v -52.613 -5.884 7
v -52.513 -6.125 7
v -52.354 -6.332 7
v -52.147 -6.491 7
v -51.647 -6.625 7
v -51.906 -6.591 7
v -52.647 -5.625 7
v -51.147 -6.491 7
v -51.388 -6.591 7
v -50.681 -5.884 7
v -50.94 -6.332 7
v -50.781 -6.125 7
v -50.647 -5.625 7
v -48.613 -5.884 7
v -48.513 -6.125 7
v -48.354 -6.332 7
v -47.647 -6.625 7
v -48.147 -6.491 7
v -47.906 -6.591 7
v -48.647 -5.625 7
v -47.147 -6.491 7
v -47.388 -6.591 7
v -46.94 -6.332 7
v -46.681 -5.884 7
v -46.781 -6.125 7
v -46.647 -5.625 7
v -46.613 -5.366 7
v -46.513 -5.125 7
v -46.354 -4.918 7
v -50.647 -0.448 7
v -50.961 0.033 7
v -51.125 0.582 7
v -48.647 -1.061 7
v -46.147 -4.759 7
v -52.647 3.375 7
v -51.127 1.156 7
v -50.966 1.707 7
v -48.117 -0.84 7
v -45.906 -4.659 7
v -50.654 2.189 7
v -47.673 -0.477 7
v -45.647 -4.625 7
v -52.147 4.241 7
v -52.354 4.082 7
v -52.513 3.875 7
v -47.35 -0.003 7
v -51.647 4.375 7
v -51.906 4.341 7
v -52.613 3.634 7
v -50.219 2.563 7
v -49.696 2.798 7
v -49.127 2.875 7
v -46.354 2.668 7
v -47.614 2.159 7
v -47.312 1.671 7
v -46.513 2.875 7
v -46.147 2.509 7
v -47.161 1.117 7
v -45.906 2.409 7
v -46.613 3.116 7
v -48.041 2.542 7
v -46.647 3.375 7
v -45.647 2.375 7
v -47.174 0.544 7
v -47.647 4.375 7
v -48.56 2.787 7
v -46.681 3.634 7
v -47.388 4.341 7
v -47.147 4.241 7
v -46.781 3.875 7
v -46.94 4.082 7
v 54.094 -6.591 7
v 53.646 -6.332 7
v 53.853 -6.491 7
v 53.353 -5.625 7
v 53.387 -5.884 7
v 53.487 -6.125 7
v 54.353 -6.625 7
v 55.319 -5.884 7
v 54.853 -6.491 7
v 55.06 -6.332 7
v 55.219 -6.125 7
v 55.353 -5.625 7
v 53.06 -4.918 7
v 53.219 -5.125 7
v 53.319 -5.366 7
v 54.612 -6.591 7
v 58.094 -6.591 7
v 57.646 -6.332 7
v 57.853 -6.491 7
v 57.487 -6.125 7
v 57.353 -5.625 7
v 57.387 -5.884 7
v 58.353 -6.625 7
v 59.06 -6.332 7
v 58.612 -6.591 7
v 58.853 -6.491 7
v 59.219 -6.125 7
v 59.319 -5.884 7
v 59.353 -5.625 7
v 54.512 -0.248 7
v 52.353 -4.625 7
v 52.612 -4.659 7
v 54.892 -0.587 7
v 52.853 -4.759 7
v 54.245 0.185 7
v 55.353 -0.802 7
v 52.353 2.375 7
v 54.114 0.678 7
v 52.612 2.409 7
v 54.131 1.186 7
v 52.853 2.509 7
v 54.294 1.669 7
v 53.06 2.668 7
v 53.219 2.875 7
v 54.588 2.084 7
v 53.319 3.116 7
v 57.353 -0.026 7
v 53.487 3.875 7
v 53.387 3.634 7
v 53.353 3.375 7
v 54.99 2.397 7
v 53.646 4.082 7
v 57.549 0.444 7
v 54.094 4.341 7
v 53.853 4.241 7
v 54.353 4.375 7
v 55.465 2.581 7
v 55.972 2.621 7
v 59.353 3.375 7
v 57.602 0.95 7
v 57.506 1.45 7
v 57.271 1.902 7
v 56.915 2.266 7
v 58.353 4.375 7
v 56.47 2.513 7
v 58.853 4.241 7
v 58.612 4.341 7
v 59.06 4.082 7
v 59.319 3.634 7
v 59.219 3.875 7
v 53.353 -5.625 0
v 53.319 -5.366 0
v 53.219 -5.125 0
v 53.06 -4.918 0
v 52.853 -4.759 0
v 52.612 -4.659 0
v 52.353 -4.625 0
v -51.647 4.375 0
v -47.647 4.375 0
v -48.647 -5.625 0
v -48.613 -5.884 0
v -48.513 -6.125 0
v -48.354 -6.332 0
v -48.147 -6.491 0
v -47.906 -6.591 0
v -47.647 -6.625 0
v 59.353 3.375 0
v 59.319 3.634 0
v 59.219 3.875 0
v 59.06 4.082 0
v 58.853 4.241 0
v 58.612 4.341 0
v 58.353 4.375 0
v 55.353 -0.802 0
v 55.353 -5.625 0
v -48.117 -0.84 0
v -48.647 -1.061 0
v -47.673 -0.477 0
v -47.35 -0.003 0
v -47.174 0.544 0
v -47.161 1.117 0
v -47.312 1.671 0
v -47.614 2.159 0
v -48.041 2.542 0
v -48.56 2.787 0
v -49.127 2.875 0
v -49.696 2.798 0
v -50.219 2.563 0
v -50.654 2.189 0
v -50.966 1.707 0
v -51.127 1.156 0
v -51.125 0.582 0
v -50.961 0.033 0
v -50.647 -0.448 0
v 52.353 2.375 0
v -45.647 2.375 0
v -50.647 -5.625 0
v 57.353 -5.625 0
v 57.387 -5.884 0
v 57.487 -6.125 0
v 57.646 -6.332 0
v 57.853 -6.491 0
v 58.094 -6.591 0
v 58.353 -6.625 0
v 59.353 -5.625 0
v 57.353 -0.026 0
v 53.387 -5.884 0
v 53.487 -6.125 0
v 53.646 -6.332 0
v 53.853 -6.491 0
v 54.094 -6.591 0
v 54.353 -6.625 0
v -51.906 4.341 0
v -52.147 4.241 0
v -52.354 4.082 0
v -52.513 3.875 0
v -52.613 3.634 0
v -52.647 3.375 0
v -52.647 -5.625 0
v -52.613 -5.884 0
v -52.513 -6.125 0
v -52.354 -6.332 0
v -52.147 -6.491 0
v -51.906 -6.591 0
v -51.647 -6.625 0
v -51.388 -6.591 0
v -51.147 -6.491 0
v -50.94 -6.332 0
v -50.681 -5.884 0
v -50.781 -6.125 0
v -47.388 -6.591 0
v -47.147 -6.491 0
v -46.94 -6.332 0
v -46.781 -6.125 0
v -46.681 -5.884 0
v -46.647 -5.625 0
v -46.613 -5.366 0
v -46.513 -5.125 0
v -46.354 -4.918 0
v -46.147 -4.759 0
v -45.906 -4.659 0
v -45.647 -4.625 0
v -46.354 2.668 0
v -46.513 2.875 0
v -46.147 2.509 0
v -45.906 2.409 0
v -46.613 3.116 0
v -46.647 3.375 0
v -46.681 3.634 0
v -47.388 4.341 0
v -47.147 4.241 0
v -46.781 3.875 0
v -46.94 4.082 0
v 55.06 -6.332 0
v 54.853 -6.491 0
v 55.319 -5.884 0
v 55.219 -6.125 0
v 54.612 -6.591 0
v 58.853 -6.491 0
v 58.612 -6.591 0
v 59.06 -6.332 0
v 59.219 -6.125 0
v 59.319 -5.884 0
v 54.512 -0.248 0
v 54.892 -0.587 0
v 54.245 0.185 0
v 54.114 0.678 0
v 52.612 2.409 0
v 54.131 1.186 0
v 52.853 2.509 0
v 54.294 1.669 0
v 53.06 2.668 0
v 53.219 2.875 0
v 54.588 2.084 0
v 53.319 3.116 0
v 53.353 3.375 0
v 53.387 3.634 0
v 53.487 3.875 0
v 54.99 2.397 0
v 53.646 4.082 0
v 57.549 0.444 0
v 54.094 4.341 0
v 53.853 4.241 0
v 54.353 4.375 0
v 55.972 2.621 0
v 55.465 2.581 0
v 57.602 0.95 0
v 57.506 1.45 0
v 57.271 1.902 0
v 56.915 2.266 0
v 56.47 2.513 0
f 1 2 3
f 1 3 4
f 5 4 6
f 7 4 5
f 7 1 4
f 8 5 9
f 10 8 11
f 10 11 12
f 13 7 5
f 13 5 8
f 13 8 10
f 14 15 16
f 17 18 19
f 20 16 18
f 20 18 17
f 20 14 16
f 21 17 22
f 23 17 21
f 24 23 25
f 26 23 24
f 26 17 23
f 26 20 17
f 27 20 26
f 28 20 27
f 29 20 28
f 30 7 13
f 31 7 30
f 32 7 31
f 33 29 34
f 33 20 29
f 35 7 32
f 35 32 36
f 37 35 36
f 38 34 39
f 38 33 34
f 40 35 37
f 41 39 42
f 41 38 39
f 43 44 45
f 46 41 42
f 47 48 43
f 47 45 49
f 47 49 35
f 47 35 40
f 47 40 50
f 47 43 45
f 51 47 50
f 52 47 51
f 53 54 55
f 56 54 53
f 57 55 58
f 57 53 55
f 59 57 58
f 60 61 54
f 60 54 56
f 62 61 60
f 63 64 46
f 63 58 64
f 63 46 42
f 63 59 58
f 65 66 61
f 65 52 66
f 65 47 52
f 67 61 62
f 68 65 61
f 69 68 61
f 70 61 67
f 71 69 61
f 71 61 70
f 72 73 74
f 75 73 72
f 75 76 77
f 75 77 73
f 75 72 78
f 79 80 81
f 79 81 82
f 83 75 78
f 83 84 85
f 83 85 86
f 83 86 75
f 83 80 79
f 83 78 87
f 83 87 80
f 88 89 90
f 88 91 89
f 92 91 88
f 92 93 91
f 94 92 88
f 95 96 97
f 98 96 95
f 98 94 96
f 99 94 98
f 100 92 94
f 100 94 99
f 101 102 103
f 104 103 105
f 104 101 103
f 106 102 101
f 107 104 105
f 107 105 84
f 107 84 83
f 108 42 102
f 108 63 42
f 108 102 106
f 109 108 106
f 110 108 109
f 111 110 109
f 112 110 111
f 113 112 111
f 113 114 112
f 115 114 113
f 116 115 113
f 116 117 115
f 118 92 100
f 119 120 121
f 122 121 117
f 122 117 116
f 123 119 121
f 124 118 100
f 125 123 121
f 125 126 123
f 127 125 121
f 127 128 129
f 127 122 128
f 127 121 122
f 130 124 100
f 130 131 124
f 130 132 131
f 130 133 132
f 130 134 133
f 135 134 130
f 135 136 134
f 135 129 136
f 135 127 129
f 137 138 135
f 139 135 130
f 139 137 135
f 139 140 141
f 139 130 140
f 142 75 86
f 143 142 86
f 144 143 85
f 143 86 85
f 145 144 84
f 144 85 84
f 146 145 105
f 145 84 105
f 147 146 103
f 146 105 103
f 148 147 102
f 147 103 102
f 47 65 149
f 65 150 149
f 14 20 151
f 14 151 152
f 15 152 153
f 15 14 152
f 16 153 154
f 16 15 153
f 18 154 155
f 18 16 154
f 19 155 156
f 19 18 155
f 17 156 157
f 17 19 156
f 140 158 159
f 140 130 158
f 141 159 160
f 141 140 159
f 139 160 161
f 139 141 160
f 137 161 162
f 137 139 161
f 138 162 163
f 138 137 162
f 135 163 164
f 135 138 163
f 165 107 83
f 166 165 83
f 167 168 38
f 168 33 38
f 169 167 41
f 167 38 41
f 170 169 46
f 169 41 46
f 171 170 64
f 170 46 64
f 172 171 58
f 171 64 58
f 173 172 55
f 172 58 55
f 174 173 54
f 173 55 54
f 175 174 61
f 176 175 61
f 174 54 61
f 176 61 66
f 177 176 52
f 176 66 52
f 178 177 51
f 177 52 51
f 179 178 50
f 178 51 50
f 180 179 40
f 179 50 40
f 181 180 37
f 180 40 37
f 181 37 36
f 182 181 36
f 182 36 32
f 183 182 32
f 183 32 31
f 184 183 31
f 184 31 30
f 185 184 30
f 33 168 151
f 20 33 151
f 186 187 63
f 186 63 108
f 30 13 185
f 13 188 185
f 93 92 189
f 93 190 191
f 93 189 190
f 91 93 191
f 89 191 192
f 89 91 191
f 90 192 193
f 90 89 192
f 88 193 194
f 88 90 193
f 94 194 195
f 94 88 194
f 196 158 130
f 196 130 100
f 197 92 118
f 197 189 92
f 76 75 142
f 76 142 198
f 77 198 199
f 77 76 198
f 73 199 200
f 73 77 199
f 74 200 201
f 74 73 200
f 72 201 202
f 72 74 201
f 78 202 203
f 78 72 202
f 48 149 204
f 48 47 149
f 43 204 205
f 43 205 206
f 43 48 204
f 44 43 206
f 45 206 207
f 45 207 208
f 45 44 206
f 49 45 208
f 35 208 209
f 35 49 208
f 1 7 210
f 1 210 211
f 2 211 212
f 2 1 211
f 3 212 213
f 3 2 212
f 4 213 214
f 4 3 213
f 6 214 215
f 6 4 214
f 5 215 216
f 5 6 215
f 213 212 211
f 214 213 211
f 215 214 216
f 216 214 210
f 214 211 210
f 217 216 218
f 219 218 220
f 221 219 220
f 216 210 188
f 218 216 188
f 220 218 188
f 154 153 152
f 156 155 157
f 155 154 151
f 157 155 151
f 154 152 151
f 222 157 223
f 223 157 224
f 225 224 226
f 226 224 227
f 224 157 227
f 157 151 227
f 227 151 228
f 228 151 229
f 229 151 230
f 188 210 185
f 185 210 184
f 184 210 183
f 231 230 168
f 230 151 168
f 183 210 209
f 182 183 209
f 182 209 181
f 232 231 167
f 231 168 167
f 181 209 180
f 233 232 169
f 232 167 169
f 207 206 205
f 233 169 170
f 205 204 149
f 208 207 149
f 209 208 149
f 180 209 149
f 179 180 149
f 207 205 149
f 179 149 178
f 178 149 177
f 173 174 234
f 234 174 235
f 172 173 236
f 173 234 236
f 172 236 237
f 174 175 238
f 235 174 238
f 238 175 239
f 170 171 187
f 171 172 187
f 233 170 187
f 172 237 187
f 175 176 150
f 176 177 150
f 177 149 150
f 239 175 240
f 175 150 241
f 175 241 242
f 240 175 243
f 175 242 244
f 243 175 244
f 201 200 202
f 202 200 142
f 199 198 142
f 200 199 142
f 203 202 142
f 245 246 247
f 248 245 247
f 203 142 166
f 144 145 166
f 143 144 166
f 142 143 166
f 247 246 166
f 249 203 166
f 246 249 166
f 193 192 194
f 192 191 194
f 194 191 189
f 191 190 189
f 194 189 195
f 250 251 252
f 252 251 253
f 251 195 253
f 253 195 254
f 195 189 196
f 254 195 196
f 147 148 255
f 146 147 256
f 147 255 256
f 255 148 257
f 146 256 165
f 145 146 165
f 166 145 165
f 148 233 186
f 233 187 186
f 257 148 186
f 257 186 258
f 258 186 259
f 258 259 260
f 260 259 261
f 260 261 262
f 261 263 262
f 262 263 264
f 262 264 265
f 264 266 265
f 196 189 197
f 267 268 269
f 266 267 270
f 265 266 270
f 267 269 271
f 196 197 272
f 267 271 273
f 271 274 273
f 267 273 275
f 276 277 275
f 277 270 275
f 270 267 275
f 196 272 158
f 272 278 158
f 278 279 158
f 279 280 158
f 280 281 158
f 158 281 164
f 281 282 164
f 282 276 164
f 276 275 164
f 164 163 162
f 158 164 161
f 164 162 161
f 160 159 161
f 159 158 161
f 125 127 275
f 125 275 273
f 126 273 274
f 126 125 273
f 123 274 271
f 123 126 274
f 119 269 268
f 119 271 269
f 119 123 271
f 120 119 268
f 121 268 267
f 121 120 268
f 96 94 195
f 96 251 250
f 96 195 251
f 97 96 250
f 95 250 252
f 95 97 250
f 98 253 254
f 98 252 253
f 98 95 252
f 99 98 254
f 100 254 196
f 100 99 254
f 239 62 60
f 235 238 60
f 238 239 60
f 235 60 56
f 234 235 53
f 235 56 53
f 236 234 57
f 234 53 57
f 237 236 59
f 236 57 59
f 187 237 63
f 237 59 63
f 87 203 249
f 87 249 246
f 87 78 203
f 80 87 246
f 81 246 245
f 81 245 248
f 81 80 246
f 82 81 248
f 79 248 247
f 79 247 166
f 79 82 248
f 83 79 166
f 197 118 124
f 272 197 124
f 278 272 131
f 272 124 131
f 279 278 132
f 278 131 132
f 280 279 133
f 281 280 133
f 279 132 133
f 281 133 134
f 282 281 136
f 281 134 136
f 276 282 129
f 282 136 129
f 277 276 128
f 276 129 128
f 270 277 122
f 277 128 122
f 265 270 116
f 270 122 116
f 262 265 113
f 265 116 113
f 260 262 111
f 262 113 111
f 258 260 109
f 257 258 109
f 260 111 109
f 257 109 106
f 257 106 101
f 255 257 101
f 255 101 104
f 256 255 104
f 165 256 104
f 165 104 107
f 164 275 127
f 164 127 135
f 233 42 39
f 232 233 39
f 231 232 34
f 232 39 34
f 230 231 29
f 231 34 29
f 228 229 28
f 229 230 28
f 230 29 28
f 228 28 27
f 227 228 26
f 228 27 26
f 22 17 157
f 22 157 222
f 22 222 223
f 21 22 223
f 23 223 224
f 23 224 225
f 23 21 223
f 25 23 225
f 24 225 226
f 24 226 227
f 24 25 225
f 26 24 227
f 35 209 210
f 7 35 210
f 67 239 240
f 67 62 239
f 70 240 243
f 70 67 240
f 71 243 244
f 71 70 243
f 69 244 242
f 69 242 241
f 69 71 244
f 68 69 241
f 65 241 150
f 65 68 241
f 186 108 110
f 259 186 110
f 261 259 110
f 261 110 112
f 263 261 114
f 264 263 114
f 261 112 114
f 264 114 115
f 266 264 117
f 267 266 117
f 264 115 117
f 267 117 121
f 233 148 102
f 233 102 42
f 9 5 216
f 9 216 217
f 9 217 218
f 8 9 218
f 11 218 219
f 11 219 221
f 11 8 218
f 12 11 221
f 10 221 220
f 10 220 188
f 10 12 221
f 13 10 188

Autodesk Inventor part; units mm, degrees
ref_plane "YZ Plane" through (0, 0, 0) normal (1, 0, 0) x (0, 1, 0)
ref_plane "XZ Plane" through (0, 0, 0) normal (0, 1, 0) x (-1, 0, 0)
ref_plane "XY Plane" through (0, 0, 0) normal (0, 0, 1) x (1, 0, 0)
sketch "Náčrt1" plane through (0, 0, 0) normal (0, 0, 1) x (1, 0, 0)
  line L0 (-46.6467, 2.3751) -> (53.3533, 2.3751)
  line L1 (53.3533, 2.3751) -> (53.3533, -4.6249)
  line L2 (53.3533, -4.6249) -> (-46.6467, -4.6249)
  line L3 (-46.6467, -4.6249) -> (-46.6467, 2.3751)
  line L4 (-46.6467, 4.3751) -> (-52.6467, 4.3751)
  line L5 (-52.6467, 4.3751) -> (-52.6467, -6.6249)
  line L6 (-46.6467, -6.6249) -> (-46.6467, 4.3751)
  line L7 (-50.6467, 2.3751) -> (-48.6467, 2.3751)
  line L8 (-48.6467, 2.3751) -> (-48.6467, -6.6249)
  line L9 (-50.6467, -6.6249) -> (-50.6467, 2.3751)
  line L10 (-52.6467, -6.6249) -> (-50.6467, -6.6249)
  line L11 (-48.6467, -6.6249) -> (-46.6467, -6.6249)
  line L12 (53.3533, 4.3751) -> (59.3533, 4.3751)
  line L13 (59.3533, 4.3751) -> (59.3533, -6.6249)
  line L14 (53.3533, -6.6249) -> (53.3533, 4.3751)
  line L15 (57.3533, -6.6249) -> (57.3533, 1.5943)
  line L16 (57.3533, 1.5943) -> (55.3533, 1.5943)
  line L17 (55.3533, 1.5943) -> (55.3533, -6.6249)
  line L18 (59.3533, -6.6249) -> (57.3533, -6.6249)
  line L19 (55.3533, -6.6249) -> (53.3533, -6.6249)
  point P0 (0, 0)
  point P1 (-47.6467, -6.6249)
  point P2 (56.3533, 4.3751)
  point P3 (55.3533, -2.5153)
  point P4 (54.3533, -6.6249)
  dimension "d0" = 100
  dimension "d1" = 7
  dimension "d2" = 2
  dimension "d4" = 6
  dimension "d5" = 2
  dimension "d6" = 0
  dimension "d7" = 2
  dimension "d8" = 2
  dimension "d9" = 2
  dimension "d10" = 2
  dimension "d11" = 6
  dimension "d12" = 0
  dimension "d14" = 2
  dimension "d15" = 2
  dimension "d16" = 2
extrude "Vysunutí1" add sketch "Náčrt1" along normal blind 7
fillet "Zaoblení1" radius 1 3 edges at (-46.6467, 4.3751, 3.5) (-46.6467, 2.3751, 3.5) (-52.6467, 4.3751, 3.5)
fillet "Zaoblení2" radius 1 3 edges at (53.3533, 2.3751, 3.5) (53.3533, 4.3751, 3.5) (59.3533, 4.3751, 3.5)
fillet "Zaoblení3" radius 1 5 edges at (-46.6467, -4.6249, 3.5) (-46.6467, -6.6249, 3.5) (-48.6467, -6.6249, 3.5) (-50.6467, -6.6249, 3.5) (-52.6467, -6.6249, 3.5)
fillet "Zaoblení4" radius 1 5 edges at (53.3533, -6.6249, 3.5) (53.3533, -4.6249, 3.5) (55.3533, -6.6249, 3.5) (57.3533, -6.6249, 3.5) (59.3533, -6.6249, 3.5)
fillet "Zaoblení5" radius 1 4 edges at (-50.6467, 2.3751, 3.5) (-48.6467, 2.3751, 3.5) (55.3533, 1.5943, 3.5) (57.3533, 1.5943, 3.5)
sketch "Náčrt2" plane through (0, 0, 7) normal (0, 0, 1) x (1, 0, 0)
  circle A0 centre (-49.1467, 0.8751) radius 2
  line L0 (-52.6467, 3.3751) -> (-52.6467, -5.6249) projected
  line L1 (-47.6467, 4.3751) -> (-51.6467, 4.3751) projected
  circle A1 centre (55.8533, 0.8751) radius 1.75
  line L2 (59.3533, -5.6249) -> (59.3533, 3.3751) projected
  line L3 (58.3533, 4.3751) -> (54.3533, 4.3751) projected
  point P0 (0, 0)
  dimension "d24" = 4
  dimension "d25" = 3.5
  dimension "d26" = 3.5
  dimension "d27" = 3.5
  dimension "d28" = 3.5
  dimension "d29" = 3.5
extrude "Vysunutí2" cut sketch "Náčrt2" against normal through all
properties part number "rozpěrka"
